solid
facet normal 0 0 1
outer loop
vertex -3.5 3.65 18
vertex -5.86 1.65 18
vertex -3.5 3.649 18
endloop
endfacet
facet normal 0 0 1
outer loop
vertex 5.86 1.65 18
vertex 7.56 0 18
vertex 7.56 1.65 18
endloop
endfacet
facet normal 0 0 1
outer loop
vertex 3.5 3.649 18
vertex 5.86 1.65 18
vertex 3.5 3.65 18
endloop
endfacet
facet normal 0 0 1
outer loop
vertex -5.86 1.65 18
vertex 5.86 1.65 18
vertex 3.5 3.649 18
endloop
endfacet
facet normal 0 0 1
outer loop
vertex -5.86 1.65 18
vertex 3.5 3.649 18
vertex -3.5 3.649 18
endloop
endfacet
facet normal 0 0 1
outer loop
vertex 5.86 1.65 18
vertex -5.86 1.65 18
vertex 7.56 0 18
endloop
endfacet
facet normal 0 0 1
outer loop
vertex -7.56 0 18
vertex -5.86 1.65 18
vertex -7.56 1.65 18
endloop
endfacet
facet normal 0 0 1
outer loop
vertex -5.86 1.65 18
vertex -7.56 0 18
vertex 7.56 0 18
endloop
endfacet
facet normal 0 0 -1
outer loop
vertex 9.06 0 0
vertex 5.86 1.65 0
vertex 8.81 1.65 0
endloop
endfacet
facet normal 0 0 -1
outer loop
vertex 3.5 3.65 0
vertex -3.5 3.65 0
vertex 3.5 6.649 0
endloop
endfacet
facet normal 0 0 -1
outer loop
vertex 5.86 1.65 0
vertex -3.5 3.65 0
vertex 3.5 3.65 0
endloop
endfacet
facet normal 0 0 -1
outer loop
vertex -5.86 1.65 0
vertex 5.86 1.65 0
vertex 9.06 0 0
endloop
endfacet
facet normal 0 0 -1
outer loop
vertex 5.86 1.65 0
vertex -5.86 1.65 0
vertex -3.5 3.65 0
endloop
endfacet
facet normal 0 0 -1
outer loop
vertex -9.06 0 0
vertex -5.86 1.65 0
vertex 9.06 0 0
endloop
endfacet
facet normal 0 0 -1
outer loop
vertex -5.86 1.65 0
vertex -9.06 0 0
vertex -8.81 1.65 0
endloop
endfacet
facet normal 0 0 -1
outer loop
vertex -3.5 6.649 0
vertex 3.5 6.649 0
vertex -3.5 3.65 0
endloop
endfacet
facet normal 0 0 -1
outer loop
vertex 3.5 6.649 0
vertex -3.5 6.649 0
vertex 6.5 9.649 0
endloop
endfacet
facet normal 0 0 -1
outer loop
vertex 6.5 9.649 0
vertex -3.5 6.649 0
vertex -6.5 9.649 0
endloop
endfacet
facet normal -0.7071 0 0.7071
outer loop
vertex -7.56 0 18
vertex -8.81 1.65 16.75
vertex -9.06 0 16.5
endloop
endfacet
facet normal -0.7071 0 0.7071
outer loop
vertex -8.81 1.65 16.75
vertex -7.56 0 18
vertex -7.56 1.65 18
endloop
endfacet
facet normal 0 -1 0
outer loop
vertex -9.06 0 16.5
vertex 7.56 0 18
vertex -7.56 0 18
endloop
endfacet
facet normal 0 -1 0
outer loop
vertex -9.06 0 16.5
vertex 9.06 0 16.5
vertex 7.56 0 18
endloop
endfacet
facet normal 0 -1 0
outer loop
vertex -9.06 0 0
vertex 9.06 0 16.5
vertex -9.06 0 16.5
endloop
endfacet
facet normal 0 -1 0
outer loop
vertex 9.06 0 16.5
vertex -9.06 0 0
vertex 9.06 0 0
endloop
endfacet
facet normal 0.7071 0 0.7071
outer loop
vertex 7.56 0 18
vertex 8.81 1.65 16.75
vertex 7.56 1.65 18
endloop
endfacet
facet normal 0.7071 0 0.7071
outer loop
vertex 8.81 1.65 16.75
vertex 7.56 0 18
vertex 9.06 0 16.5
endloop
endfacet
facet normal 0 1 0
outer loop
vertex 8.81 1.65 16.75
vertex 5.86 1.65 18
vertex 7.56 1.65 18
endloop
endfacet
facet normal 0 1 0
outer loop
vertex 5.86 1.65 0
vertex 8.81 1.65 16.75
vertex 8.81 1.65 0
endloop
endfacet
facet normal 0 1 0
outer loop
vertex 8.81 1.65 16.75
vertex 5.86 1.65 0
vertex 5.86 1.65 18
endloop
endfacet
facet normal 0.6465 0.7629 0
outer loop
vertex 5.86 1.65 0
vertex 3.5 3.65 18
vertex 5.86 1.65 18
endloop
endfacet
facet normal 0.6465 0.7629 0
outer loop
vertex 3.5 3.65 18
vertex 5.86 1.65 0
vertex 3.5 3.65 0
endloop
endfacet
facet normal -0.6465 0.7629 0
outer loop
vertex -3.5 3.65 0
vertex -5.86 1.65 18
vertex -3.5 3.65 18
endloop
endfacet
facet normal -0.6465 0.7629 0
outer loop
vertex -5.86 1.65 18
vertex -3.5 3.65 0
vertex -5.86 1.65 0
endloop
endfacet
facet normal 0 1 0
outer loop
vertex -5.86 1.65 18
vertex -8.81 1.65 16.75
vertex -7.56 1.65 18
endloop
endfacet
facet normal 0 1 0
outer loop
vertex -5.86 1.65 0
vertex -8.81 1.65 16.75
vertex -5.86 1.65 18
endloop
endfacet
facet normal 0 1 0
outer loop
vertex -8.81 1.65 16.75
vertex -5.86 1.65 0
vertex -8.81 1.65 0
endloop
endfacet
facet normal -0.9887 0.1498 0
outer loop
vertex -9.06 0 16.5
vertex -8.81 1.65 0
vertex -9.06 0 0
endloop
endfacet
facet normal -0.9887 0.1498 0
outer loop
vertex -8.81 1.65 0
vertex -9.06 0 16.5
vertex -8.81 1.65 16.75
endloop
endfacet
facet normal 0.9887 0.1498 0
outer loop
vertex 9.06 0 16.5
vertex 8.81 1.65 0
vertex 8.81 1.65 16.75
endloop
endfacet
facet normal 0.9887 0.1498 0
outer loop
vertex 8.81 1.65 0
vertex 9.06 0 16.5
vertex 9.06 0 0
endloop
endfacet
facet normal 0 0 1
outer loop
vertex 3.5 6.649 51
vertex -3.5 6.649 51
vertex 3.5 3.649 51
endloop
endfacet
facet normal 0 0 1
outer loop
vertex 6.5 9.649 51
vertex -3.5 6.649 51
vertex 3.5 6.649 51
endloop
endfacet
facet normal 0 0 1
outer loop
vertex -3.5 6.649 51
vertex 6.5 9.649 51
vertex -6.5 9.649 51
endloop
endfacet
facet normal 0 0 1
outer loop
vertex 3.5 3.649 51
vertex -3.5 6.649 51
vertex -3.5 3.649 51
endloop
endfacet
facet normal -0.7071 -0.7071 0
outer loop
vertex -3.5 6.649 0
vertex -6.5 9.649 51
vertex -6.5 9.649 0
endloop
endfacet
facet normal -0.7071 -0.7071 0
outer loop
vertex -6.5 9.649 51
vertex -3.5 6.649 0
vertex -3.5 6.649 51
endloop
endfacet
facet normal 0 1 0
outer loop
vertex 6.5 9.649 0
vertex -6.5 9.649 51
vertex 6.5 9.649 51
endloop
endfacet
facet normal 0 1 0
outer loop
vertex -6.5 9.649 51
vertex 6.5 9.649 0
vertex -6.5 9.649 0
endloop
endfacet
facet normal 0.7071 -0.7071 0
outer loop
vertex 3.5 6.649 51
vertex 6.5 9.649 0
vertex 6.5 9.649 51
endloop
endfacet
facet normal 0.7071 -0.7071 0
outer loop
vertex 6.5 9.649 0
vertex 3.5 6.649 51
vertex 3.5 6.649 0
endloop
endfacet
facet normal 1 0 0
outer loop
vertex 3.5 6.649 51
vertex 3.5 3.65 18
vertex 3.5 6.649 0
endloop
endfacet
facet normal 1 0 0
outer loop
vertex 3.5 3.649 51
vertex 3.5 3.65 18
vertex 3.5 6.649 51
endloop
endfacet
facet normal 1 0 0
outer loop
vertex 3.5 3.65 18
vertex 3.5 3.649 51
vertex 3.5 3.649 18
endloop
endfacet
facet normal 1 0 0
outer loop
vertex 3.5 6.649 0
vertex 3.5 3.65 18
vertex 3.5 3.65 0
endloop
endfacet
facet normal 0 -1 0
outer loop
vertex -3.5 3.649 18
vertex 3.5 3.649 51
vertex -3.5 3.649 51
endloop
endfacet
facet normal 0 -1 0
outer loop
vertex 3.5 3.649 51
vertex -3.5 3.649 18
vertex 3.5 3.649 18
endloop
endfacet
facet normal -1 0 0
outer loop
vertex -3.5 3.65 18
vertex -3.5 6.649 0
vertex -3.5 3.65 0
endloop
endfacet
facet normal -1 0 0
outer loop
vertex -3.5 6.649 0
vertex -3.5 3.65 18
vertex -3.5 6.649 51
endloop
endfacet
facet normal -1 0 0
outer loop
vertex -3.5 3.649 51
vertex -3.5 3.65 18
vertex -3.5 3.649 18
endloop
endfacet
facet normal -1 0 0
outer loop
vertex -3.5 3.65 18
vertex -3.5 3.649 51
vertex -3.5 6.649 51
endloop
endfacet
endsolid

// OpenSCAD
hotshoeWidthTolerance = 0.4;
hotshoeThicknessTolerance = 0.3;
   
mountOffset = 2;

dovetailWidth = 13;
dovetailHeight = 3;
dovetailStemHeight = 3;
dovetailLength = 51;
holeSpacing = 18;
holeDiameter = 4.5;

module dummy() {}

hotshoeLength = 18;
hotshoeInset = 3.2;
hotshoeTaper = 0.25;
hotshoeCorner = 1.5;   
hotshoeWidth = 18.52-hotshoeWidthTolerance;
hotshoeThickness = 1.95-hotshoeThicknessTolerance;

nudge = 0.001;    

extraWidth = dovetailWidth - 2*dovetailHeight;

module daisyDovetail() {

    render(convexity=2)
    translate([0,0,dovetailStemHeight+dovetailHeight])
    rotate([0,180,0])
    rotate([90,0,0])
    linear_extrude(height=dovetailLength)
    polygon([ [-extraWidth/2,0], [-extraWidth/2,dovetailStemHeight], [-extraWidth/2-dovetailHeight,dovetailStemHeight+dovetailHeight], [extraWidth/2+dovetailHeight,dovetailStemHeight+dovetailHeight], [extraWidth/2,dovetailStemHeight], [extraWidth/2,0]]);
}
    
module hotshoe(coverStickout = 2) {    
hotshoeProfile = [
    [-hotshoeWidth/2, 0],
    [-hotshoeWidth/2+hotshoeTaper, hotshoeThickness],
    [-hotshoeWidth/2+hotshoeInset, hotshoeThickness],
    [-extraWidth/2, hotshoeThickness+coverStickout],
    [extraWidth/2, hotshoeThickness+coverStickout],
    [hotshoeWidth/2-hotshoeInset, hotshoeThickness],
    [hotshoeWidth/2-hotshoeTaper, hotshoeThickness],
    [hotshoeWidth/2, 0] ];

    render(convexity=1)
    intersection() {
        rotate([0,0,180])
        rotate([90,0,0])
        linear_extrude(height=hotshoeThickness+coverStickout)
        polygon([[-hotshoeWidth/2,0],
            [-hotshoeWidth/2,hotshoeLength-hotshoeCorner],
            [-hotshoeWidth/2+hotshoeCorner,hotshoeLength],
            [hotshoeWidth/2-hotshoeCorner,hotshoeLength],
            [hotshoeWidth/2,hotshoeLength-hotshoeCorner],
            [hotshoeWidth/2,0]]);

        linear_extrude(height=hotshoeLength) polygon(hotshoeProfile);
    }
}

render(convexity=3)
hotshoe(coverStickout = mountOffset);
translate([0,dovetailHeight+dovetailStemHeight+mountOffset+hotshoeThickness-nudge,dovetailLength])
rotate([90,0,0])
daisyDovetail();
